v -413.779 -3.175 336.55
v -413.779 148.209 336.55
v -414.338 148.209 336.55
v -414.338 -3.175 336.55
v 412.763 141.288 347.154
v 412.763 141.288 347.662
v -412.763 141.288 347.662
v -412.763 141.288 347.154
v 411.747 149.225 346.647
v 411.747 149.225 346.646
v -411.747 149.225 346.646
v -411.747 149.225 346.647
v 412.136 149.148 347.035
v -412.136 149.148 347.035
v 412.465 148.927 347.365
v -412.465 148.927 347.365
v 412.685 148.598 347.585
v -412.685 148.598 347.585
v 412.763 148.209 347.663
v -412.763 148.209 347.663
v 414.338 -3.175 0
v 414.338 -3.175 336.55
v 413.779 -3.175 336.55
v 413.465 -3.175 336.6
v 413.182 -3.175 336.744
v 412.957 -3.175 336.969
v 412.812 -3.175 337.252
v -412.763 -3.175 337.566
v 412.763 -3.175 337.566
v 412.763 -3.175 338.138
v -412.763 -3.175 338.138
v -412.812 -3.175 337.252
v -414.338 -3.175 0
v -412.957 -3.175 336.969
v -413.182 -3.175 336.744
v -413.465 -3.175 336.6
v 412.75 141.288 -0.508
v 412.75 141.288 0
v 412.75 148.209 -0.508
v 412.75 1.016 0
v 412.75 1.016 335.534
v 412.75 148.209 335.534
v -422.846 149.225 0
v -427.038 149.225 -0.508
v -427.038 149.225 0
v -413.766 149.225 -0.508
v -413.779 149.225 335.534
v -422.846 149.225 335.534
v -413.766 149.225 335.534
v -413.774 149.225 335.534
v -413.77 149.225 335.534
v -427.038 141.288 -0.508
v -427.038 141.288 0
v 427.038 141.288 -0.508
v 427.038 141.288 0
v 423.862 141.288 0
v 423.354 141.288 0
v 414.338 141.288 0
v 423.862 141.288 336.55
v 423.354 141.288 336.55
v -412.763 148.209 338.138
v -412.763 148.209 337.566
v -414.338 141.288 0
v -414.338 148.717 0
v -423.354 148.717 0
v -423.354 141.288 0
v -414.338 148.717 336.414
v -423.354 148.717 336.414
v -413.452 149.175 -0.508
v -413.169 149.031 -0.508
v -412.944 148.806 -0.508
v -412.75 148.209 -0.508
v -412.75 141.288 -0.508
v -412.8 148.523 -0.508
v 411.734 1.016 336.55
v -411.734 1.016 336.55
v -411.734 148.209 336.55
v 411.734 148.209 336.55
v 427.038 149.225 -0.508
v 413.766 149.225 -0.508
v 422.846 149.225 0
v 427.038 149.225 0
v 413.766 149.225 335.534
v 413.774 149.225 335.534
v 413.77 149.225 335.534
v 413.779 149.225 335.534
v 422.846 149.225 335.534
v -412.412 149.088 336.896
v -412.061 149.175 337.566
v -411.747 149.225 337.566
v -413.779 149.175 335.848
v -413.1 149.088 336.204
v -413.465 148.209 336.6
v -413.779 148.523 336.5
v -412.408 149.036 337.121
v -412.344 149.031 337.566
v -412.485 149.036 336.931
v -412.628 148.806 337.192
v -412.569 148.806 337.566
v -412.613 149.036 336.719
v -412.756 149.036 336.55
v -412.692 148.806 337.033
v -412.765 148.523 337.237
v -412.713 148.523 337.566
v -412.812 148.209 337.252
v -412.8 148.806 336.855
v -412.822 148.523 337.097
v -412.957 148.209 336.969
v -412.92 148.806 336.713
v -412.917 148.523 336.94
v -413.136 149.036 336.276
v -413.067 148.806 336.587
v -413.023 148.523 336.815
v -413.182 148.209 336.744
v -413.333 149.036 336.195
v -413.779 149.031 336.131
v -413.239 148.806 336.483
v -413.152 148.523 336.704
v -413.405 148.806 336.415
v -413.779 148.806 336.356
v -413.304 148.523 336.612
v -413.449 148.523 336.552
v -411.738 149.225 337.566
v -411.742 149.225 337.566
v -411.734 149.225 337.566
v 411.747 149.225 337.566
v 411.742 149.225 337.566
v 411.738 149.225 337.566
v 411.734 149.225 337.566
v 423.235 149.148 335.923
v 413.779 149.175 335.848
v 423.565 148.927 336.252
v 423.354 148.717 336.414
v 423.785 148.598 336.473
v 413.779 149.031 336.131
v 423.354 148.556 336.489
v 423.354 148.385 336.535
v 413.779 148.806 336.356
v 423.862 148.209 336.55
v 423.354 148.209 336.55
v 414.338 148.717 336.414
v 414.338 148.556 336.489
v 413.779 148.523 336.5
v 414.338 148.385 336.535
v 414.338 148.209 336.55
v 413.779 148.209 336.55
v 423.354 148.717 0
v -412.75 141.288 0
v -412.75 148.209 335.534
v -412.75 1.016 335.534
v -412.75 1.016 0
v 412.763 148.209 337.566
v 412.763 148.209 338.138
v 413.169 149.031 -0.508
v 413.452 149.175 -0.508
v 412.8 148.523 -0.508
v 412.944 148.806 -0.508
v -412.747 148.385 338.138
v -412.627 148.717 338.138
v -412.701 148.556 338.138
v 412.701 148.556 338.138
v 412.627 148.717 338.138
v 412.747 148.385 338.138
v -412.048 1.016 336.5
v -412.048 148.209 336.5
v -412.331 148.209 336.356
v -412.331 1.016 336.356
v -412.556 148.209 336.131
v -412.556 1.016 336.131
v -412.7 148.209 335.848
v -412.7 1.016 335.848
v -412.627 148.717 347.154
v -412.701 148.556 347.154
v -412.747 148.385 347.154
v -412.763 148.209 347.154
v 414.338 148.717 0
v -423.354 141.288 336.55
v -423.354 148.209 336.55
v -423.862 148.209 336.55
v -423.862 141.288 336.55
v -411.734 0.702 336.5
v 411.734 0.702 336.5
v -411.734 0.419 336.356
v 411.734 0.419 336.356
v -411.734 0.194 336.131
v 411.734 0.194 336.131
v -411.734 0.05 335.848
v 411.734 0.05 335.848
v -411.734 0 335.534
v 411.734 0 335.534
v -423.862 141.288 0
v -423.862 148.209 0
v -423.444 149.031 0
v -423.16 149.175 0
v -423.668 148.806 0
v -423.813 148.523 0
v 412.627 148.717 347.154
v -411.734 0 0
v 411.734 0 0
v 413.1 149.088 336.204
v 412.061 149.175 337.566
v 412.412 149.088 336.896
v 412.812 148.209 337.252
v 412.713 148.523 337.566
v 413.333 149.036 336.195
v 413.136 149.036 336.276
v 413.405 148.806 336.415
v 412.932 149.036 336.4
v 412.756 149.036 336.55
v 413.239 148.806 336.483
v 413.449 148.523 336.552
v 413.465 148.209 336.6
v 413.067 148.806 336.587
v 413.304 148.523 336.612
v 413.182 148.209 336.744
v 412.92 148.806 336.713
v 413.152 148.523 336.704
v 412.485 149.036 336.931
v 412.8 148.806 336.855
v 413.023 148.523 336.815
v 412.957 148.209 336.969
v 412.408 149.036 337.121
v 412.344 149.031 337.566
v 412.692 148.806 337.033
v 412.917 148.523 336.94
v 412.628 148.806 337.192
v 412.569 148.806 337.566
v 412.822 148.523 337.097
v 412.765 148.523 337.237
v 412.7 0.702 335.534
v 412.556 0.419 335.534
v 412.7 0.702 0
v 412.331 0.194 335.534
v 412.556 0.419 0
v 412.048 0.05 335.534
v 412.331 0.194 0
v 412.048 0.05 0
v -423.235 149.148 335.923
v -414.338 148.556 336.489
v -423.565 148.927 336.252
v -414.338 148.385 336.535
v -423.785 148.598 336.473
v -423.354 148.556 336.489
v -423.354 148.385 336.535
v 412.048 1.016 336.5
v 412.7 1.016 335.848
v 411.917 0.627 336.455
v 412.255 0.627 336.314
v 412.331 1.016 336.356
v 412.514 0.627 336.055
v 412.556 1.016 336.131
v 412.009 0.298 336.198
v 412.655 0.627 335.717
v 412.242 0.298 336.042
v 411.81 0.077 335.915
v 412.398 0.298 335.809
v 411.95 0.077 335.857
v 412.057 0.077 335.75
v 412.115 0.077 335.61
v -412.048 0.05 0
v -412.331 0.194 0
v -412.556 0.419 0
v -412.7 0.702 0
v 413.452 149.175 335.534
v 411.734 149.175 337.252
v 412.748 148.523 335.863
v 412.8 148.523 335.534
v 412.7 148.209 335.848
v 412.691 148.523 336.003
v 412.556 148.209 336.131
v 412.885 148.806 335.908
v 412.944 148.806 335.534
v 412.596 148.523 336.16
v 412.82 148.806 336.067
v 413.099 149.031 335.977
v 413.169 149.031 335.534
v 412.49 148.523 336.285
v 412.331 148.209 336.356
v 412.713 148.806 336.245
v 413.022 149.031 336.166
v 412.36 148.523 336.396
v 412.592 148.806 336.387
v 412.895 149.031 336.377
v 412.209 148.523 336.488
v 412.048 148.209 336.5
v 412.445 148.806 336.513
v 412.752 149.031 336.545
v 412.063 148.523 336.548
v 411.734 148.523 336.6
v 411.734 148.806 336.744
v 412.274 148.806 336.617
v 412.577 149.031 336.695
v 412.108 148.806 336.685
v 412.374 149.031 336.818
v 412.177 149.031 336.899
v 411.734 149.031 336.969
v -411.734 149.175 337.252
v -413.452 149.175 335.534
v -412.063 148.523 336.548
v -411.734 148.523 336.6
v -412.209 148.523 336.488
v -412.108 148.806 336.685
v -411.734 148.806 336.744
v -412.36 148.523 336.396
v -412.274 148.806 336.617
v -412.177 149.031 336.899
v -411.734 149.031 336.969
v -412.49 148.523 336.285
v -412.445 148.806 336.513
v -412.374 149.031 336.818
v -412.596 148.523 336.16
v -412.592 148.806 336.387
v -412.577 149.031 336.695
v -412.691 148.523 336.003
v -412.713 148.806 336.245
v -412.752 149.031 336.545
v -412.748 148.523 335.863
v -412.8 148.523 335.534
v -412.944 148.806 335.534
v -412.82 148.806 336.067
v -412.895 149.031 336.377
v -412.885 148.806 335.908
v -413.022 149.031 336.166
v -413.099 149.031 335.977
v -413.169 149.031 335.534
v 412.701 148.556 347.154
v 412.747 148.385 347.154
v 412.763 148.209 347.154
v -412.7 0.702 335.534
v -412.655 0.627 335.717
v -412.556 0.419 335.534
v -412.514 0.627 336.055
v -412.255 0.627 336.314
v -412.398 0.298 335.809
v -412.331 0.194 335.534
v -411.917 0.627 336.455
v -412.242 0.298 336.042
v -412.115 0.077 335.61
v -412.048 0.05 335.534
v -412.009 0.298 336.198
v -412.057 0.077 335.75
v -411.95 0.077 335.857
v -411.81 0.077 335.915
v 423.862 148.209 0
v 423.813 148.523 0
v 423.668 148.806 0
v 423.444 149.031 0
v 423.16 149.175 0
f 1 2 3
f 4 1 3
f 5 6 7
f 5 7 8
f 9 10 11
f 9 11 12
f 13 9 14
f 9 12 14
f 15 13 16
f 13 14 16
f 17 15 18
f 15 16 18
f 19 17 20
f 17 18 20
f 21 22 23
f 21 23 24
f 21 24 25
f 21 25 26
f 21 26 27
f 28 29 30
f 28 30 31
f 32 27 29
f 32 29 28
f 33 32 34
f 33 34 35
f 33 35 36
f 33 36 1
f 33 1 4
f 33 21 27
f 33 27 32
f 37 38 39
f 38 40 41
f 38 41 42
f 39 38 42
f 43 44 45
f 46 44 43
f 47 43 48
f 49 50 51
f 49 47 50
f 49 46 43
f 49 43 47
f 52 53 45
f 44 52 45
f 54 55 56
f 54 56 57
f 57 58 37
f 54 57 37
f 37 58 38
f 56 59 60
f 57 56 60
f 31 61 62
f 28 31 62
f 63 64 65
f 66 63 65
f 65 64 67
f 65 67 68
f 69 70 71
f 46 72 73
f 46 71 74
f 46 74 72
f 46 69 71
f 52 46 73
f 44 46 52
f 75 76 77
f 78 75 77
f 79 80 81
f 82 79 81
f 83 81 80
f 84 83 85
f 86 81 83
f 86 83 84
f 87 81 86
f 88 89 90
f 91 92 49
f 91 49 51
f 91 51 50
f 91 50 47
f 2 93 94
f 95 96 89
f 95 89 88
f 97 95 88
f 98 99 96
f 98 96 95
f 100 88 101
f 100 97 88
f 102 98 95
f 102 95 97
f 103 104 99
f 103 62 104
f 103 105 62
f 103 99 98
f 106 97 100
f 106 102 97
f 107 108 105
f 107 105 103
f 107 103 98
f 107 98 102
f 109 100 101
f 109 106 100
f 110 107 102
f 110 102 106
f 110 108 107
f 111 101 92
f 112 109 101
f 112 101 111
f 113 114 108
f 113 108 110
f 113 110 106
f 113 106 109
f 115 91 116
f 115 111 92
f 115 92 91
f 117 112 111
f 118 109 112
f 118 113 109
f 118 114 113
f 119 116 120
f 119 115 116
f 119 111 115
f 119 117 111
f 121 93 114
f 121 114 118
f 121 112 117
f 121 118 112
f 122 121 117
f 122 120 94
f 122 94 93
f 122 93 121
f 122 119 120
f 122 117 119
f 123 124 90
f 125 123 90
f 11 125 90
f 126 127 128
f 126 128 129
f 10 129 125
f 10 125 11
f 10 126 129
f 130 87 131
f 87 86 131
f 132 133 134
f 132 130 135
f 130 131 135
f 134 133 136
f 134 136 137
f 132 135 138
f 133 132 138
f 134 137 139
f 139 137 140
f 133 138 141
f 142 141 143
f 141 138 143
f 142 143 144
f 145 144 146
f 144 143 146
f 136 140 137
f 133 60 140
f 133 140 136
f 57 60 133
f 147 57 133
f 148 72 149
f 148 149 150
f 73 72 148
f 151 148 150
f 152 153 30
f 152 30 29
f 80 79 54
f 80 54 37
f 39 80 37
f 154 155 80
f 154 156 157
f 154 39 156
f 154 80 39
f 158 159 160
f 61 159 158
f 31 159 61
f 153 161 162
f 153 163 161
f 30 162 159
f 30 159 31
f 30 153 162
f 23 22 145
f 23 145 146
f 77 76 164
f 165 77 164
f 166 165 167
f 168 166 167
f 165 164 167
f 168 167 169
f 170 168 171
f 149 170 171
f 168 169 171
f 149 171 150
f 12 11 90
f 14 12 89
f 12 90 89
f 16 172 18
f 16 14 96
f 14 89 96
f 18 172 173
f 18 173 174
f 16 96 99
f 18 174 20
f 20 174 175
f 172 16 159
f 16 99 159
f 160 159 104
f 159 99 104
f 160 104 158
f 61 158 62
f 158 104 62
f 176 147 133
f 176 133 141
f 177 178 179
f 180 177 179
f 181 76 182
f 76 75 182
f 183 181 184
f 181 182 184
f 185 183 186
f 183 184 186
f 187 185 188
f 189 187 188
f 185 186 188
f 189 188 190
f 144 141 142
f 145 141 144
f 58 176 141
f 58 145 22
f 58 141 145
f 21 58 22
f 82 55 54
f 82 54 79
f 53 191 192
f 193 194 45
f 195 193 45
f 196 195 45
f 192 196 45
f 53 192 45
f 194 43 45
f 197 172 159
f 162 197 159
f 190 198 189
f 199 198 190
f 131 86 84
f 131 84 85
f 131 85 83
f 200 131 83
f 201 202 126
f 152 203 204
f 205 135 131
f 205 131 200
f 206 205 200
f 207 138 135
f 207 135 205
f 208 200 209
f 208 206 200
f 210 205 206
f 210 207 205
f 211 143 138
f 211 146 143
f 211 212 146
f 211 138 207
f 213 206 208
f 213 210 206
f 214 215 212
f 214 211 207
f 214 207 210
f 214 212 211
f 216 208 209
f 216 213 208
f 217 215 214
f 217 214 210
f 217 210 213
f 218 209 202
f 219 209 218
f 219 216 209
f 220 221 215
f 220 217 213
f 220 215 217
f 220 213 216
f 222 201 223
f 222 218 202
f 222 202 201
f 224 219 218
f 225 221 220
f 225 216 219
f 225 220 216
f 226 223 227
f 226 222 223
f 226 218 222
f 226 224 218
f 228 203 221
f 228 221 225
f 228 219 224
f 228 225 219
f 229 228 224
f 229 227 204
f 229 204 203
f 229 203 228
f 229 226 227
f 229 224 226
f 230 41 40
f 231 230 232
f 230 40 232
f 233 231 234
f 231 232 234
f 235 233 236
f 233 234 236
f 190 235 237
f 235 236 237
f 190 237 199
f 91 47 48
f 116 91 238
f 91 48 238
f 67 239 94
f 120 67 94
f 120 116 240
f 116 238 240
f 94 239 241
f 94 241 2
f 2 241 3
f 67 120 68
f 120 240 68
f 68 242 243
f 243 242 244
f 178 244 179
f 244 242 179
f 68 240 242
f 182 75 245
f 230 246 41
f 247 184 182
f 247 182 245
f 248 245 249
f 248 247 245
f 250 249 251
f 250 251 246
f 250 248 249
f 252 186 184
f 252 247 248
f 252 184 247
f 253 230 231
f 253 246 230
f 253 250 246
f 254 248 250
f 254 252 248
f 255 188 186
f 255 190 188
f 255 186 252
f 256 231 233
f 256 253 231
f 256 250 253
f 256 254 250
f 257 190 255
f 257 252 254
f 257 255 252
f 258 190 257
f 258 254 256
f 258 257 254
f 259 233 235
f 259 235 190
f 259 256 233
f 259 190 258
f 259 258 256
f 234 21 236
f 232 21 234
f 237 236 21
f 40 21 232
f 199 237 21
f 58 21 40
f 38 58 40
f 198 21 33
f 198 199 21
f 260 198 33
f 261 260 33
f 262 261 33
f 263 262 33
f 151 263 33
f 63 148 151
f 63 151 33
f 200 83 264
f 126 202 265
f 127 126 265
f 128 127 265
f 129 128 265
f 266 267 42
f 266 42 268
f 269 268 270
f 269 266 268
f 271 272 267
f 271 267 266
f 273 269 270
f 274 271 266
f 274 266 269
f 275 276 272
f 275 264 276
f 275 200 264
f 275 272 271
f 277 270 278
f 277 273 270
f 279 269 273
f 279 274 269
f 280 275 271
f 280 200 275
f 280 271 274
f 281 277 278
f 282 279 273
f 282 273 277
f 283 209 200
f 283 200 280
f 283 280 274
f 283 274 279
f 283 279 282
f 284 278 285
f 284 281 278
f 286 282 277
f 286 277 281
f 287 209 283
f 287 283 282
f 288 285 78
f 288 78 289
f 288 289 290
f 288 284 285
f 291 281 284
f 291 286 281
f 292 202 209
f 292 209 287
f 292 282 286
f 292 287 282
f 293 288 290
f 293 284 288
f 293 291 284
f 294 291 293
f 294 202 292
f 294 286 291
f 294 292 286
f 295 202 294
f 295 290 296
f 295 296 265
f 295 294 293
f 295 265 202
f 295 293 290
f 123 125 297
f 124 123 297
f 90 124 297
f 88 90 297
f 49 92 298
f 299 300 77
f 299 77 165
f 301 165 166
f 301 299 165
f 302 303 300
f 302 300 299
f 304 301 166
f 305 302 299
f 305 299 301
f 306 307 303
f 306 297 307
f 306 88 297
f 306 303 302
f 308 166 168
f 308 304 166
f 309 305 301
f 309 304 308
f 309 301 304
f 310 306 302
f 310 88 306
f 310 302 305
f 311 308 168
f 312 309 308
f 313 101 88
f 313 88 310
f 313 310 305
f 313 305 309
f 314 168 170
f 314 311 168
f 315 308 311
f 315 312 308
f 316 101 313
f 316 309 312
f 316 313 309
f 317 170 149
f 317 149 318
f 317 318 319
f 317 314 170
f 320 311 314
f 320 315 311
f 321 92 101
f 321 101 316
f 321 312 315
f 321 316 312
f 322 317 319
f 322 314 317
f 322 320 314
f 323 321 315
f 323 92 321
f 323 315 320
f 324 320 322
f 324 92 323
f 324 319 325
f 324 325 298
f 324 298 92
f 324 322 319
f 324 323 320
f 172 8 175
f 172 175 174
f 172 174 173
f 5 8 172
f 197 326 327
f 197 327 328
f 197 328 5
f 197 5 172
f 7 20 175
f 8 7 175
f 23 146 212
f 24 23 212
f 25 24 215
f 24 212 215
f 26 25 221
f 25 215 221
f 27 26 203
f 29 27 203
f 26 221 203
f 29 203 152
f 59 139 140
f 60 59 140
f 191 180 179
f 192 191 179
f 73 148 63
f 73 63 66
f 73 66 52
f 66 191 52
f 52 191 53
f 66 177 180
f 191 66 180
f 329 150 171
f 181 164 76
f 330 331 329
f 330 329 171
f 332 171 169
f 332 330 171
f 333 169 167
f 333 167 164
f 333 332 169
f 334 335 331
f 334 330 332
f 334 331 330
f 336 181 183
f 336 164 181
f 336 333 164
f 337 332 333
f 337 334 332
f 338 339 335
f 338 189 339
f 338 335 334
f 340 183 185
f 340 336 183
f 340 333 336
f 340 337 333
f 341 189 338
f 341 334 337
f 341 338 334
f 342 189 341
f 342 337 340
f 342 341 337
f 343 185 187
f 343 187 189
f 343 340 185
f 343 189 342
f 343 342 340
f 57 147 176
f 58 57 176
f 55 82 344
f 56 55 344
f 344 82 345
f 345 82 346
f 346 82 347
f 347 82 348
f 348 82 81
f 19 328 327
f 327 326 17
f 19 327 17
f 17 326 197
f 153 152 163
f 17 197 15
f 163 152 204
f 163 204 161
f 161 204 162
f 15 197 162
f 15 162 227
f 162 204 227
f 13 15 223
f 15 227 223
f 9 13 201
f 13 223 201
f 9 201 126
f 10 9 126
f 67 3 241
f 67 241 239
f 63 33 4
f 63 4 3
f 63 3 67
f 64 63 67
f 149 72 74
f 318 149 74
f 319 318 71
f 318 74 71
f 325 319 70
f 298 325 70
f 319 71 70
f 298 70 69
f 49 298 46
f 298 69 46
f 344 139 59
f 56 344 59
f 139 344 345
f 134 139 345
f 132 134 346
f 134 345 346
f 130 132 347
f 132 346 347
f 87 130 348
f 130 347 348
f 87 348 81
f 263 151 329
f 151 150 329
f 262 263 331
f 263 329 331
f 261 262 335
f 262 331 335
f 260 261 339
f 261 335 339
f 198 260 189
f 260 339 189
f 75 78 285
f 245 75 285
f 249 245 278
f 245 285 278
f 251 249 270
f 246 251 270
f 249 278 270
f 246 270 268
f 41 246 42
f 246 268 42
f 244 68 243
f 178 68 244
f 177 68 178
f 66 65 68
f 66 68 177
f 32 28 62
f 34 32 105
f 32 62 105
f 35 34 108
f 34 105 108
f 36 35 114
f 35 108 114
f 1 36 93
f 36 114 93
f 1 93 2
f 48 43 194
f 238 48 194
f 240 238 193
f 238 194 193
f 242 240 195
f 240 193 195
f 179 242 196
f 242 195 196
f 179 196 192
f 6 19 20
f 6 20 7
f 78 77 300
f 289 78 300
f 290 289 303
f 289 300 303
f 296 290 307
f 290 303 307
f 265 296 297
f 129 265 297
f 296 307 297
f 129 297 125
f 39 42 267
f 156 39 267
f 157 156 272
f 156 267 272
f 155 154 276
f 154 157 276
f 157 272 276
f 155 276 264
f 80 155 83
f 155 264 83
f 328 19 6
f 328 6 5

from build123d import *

# Parameters (mm, degrees)
BOSS_EXTRUDE1_DEPTH = 336.55
SKETCH2_W           = 14.2875
SKETCH2_H           = 7.9375
BOSS_EXTRUDE2_DEPTH = 0.508
BOSS_EXTRUDE6_DEPTH = 412.7627
FILLET1_R           = 1.016
FILLET2_R           = 1.016
FILLET3_R           = 1.016
FILLET4_R           = 1.016
FILLET5_R           = 1.016


with BuildPart() as part:
    # Sketch1 → Boss-Extrude1 (new body)
    with BuildSketch(Plane.XY):
        Polygon((-412.75, 0), (412.75, 0), (412.75, 149.225), (423.8625, 149.225), (423.8625, 141.2875), (423.3545, 141.2875), (423.3545, 148.717), (414.3375, 148.717), (414.3375, -3.175), (-414.3375, -3.175), (-414.3375, 148.717), (-423.3545, 148.717), (-423.3545, 141.2875), (-423.8625, 141.2875), (-423.8625, 149.225), (-412.75, 149.225), align=None)
    extrude(amount=BOSS_EXTRUDE1_DEPTH)

    # Sketch2 → Boss-Extrude2 (add)
    with BuildSketch(Plane(origin=(0, 0, 0), x_dir=(-1, 0, 0), z_dir=(0, 0, -1))):
        with Locations((-419.89375, 145.25625)):
            Rectangle(SKETCH2_W, SKETCH2_H)
        with Locations((419.89375, 145.25625)):
            Rectangle(SKETCH2_W, SKETCH2_H)
    extrude(amount=BOSS_EXTRUDE2_DEPTH)

    # Sketch3 → Boss-Extrude6 (add, symmetric)
    with BuildSketch(Plane(origin=(0, 0, 0), x_dir=(0, 0, -1), z_dir=(1, 0, 0))):
        Polygon((-336.55, -3.175), (-336.55, 149.225), (-347.6625, 149.225), (-347.6625, 141.2875), (-347.1545, 141.2875), (-347.1545, 148.717), (-338.1375, 148.717), (-338.1375, -3.175), align=None)
    extrude(amount=BOSS_EXTRUDE6_DEPTH, both=True)

    # Fillet1
    fillet1_edges = [part.edges().sort_by_distance(p)[0] for p in [
        (412.75, 74.6125, 336.55),
    ]]
    fillet(fillet1_edges, radius=FILLET1_R)

    # Fillet2
    fillet2_edges = [part.edges().sort_by_distance(p)[0] for p in [
        (412.7627, 73.025, 336.55),
    ]]
    fillet(fillet2_edges, radius=FILLET2_R)

    # Fillet3
    fillet3_edges = [part.edges().sort_by_distance(p)[0] for p in [
        (-412.75, 74.6125, 336.55),
        (-412.7627, 73.025, 336.55),
    ]]
    fillet(fillet3_edges, radius=FILLET3_R)

    # Fillet4
    fillet4_edges = [part.edges().sort_by_distance(p)[0] for p in [
        (0, 0, 336.55),
        (412.75, 0, 167.767),
        (412.45242049, 0, 336.25242049),
        (-412.75, 0, 167.767),
        (-412.45242049, 0, 336.25242049),
    ]]
    fillet(fillet4_edges, radius=FILLET4_R)

    # Fillet5
    # the kernel refuses this fillet: 1.016 mm, written as the material it takes off along each edge
    with BuildSketch(Plane(origin=(413.7787, 149.225, 336.55), x_dir=(0, 0, -1), z_dir=(1, 0, 0)), Plane(origin=(-426.4025, 149.225, 336.55), x_dir=(0, 0, -1), z_dir=(1, 0, 0))) as fillet5_piece_1:
        with BuildLine():
            CenterArc((FILLET5_R, -FILLET5_R), FILLET5_R, 90, 90)
            Line((0, -FILLET5_R), (0, 0))
            Line((0, 0), (FILLET5_R, 0))
        make_face()
    fillet5_piece_1_solid = extrude(amount=12.6238, mode=Mode.PRIVATE)
    with BuildSketch(Plane(origin=(413.7787, 149.225, 337.566), x_dir=(0, 0, -1), z_dir=(1, 0, 0))) as fillet5_piece_2:
        with BuildLine():
            CenterArc((1.016 + FILLET5_R, -FILLET5_R), FILLET5_R, 90, 90)
            Line((1.016, -FILLET5_R), (1.016, 0))
            Line((1.016, 0), (1.016 + FILLET5_R, 0))
        make_face()
    fillet5_piece_2_solid = revolve(axis=Axis((413.7787, 149.225, 337.566), (0, 1, 0)), revolution_arc=90, mode=Mode.PRIVATE)
    with BuildSketch(Plane(origin=(-413.7787, 149.225, 337.566), x_dir=(1, 0, 0), z_dir=(0, 0, 1))) as fillet5_piece_3:
        with BuildLine():
            CenterArc((1.016 + FILLET5_R, -FILLET5_R), FILLET5_R, 90, 90)
            Line((1.016, -FILLET5_R), (1.016, 0))
            Line((1.016, 0), (1.016 + FILLET5_R, 0))
        make_face()
    fillet5_piece_3_solid = revolve(axis=Axis((-413.7787, 149.225, 337.566), (0, 1, 0)), revolution_arc=90, mode=Mode.PRIVATE)
    with BuildSketch(Plane(origin=(-412.75, 149.225, -3.048), x_dir=(0, -1, 0), z_dir=(0, 0, 1))) as fillet5_piece_4:
        with BuildLine():
            CenterArc((FILLET5_R, -FILLET5_R), FILLET5_R, 90, 90)
            Line((0, -FILLET5_R), (0, 0))
            Line((0, 0), (FILLET5_R, 0))
        make_face()
    fillet5_piece_4_solid = extrude(amount=338.582, mode=Mode.PRIVATE)
    with BuildSketch(Plane(origin=(-411.734, 149.225, 335.534), x_dir=(0, 0, 1), z_dir=(1, 0, 0))) as fillet5_piece_5:
        with BuildLine():
            CenterArc((1.016 + FILLET5_R, FILLET5_R), FILLET5_R, 180, 90)
            Line((1.016 + FILLET5_R, 0), (1.016, 0))
            Line((1.016, 0), (1.016, FILLET5_R))
        make_face()
    fillet5_piece_5_solid = revolve(axis=Axis((-411.734, 149.225, 335.534), (0, -1, 0)), revolution_arc=90, mode=Mode.PRIVATE)
    with BuildSketch(Plane(origin=(-411.734, 149.225, 336.55), x_dir=(0, 0, 1), z_dir=(1, 0, 0))) as fillet5_piece_6:
        with BuildLine():
            CenterArc((FILLET5_R, FILLET5_R), FILLET5_R, 180, 90)
            Line((0, FILLET5_R), (0, 0))
            Line((0, 0), (FILLET5_R, 0))
        make_face()
    fillet5_piece_6_solid = extrude(amount=823.468, mode=Mode.PRIVATE)
    with BuildSketch(Plane(origin=(411.734, 149.225, 335.534), x_dir=(1, 0, 0), z_dir=(0, 0, -1))) as fillet5_piece_7:
        with BuildLine():
            CenterArc((1.016 + FILLET5_R, FILLET5_R), FILLET5_R, 180, 90)
            Line((1.016, FILLET5_R), (1.016, 0))
            Line((1.016, 0), (1.016 + FILLET5_R, 0))
        make_face()
    fillet5_piece_7_solid = revolve(axis=Axis((411.734, 149.225, 335.534), (0, -1, 0)), revolution_arc=90, mode=Mode.PRIVATE)
    with BuildSketch(Plane(origin=(412.7627, 149.225, 337.566), x_dir=(-1, 0, 0), z_dir=(0, 0, 1))) as fillet5_piece_8:
        with BuildLine():
            CenterArc((FILLET5_R, FILLET5_R), FILLET5_R, 180, 90)
            Line((0, FILLET5_R), (0, 0))
            Line((0, 0), (FILLET5_R, 0))
        make_face()
    fillet5_piece_8_solid = extrude(amount=12.6365, mode=Mode.PRIVATE)
    with BuildSketch(Plane(origin=(-412.7627, 149.225, 337.566), x_dir=(1, 0, 0), z_dir=(0, 0, 1))) as fillet5_piece_9:
        with BuildLine():
            CenterArc((FILLET5_R, -FILLET5_R), FILLET5_R, 90, 90)
            Line((0, -FILLET5_R), (0, 0))
            Line((0, 0), (FILLET5_R, 0))
        make_face()
    fillet5_piece_9_solid = extrude(amount=12.6365, mode=Mode.PRIVATE)
    with BuildSketch(Plane(origin=(-415.3027, 149.225, 347.6625), x_dir=(0, 0, -1), z_dir=(1, 0, 0))) as fillet5_piece_10:
        with BuildLine():
            CenterArc((FILLET5_R, -FILLET5_R), FILLET5_R, 90, 90)
            Line((0, -FILLET5_R), (0, 0))
            Line((0, 0), (FILLET5_R, 0))
        make_face()
    fillet5_piece_10_solid = extrude(amount=830.6054, mode=Mode.PRIVATE)
    with BuildSketch(Plane(origin=(-423.8625, 149.225, 0), x_dir=(1, 0, 0), z_dir=(0, 0, 1))) as fillet5_piece_11:
        with BuildLine():
            CenterArc((FILLET5_R, -FILLET5_R), FILLET5_R, 90, 90)
            Line((0, -FILLET5_R), (0, 0))
            Line((0, 0), (FILLET5_R, 0))
        make_face()
    fillet5_piece_11_solid = extrude(amount=339.09, mode=Mode.PRIVATE)
    with BuildSketch(Plane(origin=(412.75, 149.225, 335.534), x_dir=(1, 0, 0), z_dir=(0, 0, -1))) as fillet5_piece_12:
        with BuildLine():
            CenterArc((FILLET5_R, FILLET5_R), FILLET5_R, 180, 90)
            Line((0, FILLET5_R), (0, 0))
            Line((0, 0), (FILLET5_R, 0))
        make_face()
    fillet5_piece_12_solid = extrude(amount=338.582, mode=Mode.PRIVATE)
    with BuildSketch(Plane(origin=(423.8625, 149.225, 0), x_dir=(-1, 0, 0), z_dir=(0, 0, 1))) as fillet5_piece_13:
        with BuildLine():
            CenterArc((FILLET5_R, FILLET5_R), FILLET5_R, 180, 90)
            Line((0, FILLET5_R), (0, 0))
            Line((0, 0), (FILLET5_R, 0))
        make_face()
    fillet5_piece_13_solid = extrude(amount=339.09, mode=Mode.PRIVATE)
    add([fillet5_piece_1_solid, fillet5_piece_2_solid, fillet5_piece_3_solid, fillet5_piece_4_solid, fillet5_piece_5_solid, fillet5_piece_6_solid, fillet5_piece_7_solid, fillet5_piece_8_solid, fillet5_piece_9_solid, fillet5_piece_10_solid, fillet5_piece_11_solid, fillet5_piece_12_solid, fillet5_piece_13_solid], mode=Mode.SUBTRACT)


solid = part.part
